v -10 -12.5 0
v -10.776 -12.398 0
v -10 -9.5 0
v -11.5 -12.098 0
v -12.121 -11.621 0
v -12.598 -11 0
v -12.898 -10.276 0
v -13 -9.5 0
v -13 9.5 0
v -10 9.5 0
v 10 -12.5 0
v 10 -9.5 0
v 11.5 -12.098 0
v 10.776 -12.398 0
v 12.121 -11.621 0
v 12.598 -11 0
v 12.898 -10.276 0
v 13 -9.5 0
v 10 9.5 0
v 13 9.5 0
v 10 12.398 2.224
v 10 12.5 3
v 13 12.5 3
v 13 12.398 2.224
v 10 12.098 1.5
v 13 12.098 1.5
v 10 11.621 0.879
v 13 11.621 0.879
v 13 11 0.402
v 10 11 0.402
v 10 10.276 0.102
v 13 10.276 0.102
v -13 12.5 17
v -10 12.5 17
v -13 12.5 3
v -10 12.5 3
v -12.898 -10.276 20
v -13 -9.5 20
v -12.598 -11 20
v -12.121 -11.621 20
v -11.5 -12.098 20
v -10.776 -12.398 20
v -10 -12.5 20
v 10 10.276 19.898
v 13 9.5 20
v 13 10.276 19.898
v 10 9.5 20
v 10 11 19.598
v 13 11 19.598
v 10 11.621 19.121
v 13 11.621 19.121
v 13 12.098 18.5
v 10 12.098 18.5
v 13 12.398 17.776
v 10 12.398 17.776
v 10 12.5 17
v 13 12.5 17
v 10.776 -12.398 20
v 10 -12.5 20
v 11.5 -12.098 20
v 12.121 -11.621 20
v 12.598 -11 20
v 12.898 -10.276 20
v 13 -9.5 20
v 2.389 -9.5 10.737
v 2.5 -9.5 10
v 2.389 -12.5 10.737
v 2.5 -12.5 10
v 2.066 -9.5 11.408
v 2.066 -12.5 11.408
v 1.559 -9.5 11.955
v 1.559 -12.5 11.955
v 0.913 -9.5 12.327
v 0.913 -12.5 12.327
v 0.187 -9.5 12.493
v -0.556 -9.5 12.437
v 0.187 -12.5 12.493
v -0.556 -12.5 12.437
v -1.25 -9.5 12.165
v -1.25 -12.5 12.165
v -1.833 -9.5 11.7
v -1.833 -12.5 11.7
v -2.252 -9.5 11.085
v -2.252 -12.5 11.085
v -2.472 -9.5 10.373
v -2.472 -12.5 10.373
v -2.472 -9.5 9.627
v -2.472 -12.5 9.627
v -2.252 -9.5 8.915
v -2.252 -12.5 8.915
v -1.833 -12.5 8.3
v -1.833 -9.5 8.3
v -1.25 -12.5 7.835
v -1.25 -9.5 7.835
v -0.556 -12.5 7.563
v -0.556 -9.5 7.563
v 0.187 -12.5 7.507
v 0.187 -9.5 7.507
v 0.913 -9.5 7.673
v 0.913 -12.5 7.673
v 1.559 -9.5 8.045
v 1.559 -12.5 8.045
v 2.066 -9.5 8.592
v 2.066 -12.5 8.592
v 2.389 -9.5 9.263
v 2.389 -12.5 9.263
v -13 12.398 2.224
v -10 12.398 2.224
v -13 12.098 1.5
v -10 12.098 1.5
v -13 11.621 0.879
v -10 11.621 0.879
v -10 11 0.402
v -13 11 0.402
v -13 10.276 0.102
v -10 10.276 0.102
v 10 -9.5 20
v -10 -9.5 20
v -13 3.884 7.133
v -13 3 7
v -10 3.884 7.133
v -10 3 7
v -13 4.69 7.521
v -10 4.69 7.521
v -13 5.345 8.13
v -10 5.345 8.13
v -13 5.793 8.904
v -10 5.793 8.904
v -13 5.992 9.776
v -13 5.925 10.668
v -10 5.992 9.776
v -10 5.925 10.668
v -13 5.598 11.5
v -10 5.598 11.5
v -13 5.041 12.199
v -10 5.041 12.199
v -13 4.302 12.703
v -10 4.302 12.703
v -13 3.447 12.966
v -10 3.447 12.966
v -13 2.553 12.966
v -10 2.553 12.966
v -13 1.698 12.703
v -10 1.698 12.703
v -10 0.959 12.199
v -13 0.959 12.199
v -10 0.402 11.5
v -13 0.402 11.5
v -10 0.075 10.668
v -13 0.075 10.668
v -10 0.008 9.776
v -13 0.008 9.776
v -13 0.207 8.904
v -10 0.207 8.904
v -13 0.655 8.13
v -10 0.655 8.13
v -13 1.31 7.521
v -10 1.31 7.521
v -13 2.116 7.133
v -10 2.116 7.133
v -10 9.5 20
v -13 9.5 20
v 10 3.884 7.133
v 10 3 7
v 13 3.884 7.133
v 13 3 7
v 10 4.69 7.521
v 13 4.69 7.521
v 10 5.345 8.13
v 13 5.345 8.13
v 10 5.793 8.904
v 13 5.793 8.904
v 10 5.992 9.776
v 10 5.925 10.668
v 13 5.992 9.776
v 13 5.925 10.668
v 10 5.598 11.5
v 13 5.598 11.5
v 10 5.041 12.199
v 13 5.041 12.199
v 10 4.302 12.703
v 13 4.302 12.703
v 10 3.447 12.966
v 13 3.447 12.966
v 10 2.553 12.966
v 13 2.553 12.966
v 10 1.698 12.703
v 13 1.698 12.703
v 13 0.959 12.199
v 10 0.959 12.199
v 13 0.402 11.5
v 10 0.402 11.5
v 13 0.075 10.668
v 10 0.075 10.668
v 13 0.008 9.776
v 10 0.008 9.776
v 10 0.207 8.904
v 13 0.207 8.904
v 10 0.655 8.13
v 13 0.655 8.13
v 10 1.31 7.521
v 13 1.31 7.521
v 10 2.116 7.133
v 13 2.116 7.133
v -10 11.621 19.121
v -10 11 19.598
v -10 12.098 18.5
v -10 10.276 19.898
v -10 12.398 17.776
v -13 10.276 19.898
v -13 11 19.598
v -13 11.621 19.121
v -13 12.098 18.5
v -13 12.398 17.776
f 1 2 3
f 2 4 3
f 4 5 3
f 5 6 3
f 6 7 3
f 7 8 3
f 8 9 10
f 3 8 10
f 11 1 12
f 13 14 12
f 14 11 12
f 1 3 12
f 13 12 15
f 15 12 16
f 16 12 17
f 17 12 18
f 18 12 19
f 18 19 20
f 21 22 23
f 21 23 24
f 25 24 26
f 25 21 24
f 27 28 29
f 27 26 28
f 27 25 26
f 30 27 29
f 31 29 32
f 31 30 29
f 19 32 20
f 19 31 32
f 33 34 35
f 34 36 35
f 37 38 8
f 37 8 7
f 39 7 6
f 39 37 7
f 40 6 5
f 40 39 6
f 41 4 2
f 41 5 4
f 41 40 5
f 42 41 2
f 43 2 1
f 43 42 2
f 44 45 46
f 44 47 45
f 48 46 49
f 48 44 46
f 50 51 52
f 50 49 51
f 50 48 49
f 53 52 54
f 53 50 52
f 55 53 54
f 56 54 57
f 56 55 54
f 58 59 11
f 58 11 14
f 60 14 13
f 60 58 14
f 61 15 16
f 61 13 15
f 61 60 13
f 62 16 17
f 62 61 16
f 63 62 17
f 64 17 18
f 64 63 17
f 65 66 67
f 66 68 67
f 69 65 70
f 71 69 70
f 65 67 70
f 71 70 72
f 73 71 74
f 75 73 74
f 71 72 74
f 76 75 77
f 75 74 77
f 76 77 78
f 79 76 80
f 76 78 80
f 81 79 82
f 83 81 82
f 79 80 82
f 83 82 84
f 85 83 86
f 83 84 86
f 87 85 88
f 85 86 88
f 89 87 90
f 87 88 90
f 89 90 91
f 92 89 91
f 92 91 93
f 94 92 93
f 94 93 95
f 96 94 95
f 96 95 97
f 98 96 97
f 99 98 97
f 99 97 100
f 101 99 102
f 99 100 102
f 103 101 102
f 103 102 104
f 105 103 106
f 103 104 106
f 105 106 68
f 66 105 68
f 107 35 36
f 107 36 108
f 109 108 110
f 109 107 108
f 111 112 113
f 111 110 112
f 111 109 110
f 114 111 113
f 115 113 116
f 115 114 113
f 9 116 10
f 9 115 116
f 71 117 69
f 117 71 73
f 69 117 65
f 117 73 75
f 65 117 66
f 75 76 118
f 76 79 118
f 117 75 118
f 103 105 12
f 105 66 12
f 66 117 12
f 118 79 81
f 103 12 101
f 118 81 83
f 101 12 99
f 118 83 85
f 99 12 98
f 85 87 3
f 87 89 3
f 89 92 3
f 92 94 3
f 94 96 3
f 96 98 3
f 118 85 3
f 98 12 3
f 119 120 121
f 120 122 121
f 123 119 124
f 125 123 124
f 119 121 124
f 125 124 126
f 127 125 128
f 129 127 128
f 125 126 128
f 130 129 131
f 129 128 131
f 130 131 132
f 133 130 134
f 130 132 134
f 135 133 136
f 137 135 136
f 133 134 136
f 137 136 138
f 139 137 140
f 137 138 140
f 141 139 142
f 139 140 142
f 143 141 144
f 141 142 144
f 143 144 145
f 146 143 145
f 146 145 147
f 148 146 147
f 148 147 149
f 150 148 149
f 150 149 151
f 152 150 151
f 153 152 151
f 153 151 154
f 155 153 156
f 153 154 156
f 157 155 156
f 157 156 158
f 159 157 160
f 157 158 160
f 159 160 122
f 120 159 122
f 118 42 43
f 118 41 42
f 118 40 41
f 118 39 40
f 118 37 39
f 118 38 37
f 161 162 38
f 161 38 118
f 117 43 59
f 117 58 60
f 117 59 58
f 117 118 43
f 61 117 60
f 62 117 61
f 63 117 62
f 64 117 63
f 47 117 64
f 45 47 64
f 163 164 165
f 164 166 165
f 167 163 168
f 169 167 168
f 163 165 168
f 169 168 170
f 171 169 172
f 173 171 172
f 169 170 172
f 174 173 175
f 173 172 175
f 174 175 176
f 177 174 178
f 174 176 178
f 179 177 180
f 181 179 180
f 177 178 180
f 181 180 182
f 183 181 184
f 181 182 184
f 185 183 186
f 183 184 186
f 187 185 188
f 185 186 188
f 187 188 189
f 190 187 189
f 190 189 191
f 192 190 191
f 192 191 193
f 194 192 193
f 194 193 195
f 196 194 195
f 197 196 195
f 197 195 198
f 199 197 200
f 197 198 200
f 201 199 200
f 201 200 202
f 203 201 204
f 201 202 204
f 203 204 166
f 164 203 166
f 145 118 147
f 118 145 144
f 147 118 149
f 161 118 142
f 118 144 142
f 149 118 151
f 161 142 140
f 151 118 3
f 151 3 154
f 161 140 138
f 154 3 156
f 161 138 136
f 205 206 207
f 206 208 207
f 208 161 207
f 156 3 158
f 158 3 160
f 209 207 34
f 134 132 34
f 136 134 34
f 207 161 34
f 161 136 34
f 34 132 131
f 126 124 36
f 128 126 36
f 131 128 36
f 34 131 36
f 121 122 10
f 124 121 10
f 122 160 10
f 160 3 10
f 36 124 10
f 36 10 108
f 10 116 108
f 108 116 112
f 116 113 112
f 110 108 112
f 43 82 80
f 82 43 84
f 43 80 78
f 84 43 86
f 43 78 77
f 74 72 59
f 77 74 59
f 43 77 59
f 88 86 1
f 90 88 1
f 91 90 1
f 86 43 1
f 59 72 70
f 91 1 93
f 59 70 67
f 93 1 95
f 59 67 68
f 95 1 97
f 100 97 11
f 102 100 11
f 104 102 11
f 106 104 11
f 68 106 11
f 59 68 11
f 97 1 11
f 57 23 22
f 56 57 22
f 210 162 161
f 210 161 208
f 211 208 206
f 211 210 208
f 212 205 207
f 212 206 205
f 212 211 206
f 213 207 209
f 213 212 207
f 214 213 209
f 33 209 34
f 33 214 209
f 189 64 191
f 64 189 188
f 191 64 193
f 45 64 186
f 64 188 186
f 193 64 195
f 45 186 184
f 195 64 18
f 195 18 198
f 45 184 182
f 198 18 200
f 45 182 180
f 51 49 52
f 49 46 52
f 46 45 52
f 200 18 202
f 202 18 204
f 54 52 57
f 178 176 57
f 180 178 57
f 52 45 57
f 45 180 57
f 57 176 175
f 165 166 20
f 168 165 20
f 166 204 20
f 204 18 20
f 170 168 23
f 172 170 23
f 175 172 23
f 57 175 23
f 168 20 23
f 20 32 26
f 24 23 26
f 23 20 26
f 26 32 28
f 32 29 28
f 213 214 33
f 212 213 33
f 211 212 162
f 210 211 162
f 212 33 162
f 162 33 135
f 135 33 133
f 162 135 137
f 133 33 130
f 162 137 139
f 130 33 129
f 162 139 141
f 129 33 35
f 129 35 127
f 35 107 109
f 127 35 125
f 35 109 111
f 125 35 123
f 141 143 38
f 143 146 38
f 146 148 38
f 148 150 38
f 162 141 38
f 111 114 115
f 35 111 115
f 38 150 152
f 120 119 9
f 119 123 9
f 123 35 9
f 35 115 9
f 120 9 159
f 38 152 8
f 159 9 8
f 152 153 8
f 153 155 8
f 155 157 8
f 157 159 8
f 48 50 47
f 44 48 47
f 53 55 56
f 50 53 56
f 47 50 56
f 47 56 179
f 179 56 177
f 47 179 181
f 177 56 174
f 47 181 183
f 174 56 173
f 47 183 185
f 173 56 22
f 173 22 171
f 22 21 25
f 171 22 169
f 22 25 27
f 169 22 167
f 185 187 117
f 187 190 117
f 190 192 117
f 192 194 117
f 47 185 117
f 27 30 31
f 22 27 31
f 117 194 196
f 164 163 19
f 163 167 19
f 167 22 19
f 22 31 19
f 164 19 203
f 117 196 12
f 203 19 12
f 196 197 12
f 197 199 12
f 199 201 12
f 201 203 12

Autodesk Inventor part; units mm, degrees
ref_plane "YZ Plane" through (0, 0, 0) normal (1, 0, 0) x (0, 1, 0)
ref_plane "XZ Plane" through (0, 0, 0) normal (0, 1, 0) x (-1, 0, 0)
ref_plane "XY Plane" through (0, 0, 0) normal (0, 0, 1) x (1, 0, 0)
sketch "Sketch1" plane through (0, 0, 0) normal (0, 0, 1) x (1, 0, 0)
  line L0 (-13, -12.5) -> (13, -12.5) construction
  line L1 (13, -12.5) -> (13, 12.5) construction
  line L2 (13, 12.5) -> (-13, 12.5) construction
  line L3 (-13, 12.5) -> (-13, -12.5) construction
  line L4 (-13, -12.5) -> (13, 12.5) construction
  line L5 (13, -12.5) -> (-13, 12.5) construction
  line L6 (-10, 12.5) -> (10, 12.5) construction
  line L7 (10, 12.5) -> (10, -9.5) construction
  line L8 (10, -9.5) -> (-10, -9.5) construction
  line L9 (-10, -9.5) -> (-10, 12.5) construction
  line L10 (-10, 12.5) -> (-13, 12.5)
  line L11 (-13, 12.5) -> (-13, -12.5)
  line L12 (-13, -12.5) -> (13, -12.5)
  line L13 (13, -12.5) -> (13, 12.5)
  line L14 (13, 12.5) -> (10, 12.5)
  line L15 (10, 12.5) -> (10, -9.5)
  line L16 (10, -9.5) -> (-10, -9.5)
  line L17 (-10, -9.5) -> (-10, 12.5)
  point P0 (0, 0)
  dimension "d0" = 26
  dimension "d1" = 25
  dimension "d2" = 3
  dimension "d3" = 3
  dimension "d4" = 3
extrude "Extrusion1" add sketch "Sketch1" along normal blind 20
sketch "Sketch2" plane through (13, -12.5, 0) normal (1, 0, 0) x (0, 0, -1)
  line L0 (-20, 25) -> (-20, 0) construction
  line L1 (0, 0) -> (0, 25) construction
  line L2 (-20, 25) -> (0, 25) construction
  line L3 (0, 25) -> (0, 5) construction
  line L4 (0, 5) -> (-20, 5) construction
  line L5 (-20, 5) -> (-20, 25) construction
  line L6 (-20, 25) -> (0, 5) construction
  line L7 (-20, 5) -> (0, 25) construction
  line L8 (0, 25) -> (-20, 25) construction
  line L9 (-10, 25) -> (-10, 5) construction
  circle A0 centre (-10, 15.5) radius 3
  line L10 (0, 25) -> (0, 0) projected
  line L11 (-20, 0) -> (0, 0) construction
  line L12 (0, 0) -> (0, 3) construction
  line L13 (0, 3) -> (-20, 3) construction
  line L14 (-20, 3) -> (-20, 0) construction
  point P0 (0, 12.5)
  dimension "d7" = 20
  dimension "d17" = 6
  dimension "d20" = 3
  dimension "d21" = 12.5
extrude "Extrusion2" cut sketch "Sketch2" against normal blind 39
sketch "Sketch3" plane through (-13, -12.5, 0) normal (0, -1, 0) x (1, 0, 0)
  line L0 (0, 20) -> (26, 0) construction
  line L1 (0, 0) -> (26, 20) construction
  circle A0 centre (13, 10) radius 2.5
  point P0 (13, 0)
  dimension "d11" = 5
extrude "Extrusion3" cut sketch "Sketch3" against normal blind 39
fillet "Fillet2" radius 3 2 edges at (13, -12.5, 10) (-13, -12.5, 10)
fillet "Fillet3" radius 3 4 edges at (-11.5, 12.5, 20) (-11.5, 12.5, 0) (11.5, 12.5, 20) (11.5, 12.5, 0)
equation "\"d3\" = d2"
equation "\"d4\" = d3"
properties part number "linear_actuator_connector" material "Iron, Cast"
